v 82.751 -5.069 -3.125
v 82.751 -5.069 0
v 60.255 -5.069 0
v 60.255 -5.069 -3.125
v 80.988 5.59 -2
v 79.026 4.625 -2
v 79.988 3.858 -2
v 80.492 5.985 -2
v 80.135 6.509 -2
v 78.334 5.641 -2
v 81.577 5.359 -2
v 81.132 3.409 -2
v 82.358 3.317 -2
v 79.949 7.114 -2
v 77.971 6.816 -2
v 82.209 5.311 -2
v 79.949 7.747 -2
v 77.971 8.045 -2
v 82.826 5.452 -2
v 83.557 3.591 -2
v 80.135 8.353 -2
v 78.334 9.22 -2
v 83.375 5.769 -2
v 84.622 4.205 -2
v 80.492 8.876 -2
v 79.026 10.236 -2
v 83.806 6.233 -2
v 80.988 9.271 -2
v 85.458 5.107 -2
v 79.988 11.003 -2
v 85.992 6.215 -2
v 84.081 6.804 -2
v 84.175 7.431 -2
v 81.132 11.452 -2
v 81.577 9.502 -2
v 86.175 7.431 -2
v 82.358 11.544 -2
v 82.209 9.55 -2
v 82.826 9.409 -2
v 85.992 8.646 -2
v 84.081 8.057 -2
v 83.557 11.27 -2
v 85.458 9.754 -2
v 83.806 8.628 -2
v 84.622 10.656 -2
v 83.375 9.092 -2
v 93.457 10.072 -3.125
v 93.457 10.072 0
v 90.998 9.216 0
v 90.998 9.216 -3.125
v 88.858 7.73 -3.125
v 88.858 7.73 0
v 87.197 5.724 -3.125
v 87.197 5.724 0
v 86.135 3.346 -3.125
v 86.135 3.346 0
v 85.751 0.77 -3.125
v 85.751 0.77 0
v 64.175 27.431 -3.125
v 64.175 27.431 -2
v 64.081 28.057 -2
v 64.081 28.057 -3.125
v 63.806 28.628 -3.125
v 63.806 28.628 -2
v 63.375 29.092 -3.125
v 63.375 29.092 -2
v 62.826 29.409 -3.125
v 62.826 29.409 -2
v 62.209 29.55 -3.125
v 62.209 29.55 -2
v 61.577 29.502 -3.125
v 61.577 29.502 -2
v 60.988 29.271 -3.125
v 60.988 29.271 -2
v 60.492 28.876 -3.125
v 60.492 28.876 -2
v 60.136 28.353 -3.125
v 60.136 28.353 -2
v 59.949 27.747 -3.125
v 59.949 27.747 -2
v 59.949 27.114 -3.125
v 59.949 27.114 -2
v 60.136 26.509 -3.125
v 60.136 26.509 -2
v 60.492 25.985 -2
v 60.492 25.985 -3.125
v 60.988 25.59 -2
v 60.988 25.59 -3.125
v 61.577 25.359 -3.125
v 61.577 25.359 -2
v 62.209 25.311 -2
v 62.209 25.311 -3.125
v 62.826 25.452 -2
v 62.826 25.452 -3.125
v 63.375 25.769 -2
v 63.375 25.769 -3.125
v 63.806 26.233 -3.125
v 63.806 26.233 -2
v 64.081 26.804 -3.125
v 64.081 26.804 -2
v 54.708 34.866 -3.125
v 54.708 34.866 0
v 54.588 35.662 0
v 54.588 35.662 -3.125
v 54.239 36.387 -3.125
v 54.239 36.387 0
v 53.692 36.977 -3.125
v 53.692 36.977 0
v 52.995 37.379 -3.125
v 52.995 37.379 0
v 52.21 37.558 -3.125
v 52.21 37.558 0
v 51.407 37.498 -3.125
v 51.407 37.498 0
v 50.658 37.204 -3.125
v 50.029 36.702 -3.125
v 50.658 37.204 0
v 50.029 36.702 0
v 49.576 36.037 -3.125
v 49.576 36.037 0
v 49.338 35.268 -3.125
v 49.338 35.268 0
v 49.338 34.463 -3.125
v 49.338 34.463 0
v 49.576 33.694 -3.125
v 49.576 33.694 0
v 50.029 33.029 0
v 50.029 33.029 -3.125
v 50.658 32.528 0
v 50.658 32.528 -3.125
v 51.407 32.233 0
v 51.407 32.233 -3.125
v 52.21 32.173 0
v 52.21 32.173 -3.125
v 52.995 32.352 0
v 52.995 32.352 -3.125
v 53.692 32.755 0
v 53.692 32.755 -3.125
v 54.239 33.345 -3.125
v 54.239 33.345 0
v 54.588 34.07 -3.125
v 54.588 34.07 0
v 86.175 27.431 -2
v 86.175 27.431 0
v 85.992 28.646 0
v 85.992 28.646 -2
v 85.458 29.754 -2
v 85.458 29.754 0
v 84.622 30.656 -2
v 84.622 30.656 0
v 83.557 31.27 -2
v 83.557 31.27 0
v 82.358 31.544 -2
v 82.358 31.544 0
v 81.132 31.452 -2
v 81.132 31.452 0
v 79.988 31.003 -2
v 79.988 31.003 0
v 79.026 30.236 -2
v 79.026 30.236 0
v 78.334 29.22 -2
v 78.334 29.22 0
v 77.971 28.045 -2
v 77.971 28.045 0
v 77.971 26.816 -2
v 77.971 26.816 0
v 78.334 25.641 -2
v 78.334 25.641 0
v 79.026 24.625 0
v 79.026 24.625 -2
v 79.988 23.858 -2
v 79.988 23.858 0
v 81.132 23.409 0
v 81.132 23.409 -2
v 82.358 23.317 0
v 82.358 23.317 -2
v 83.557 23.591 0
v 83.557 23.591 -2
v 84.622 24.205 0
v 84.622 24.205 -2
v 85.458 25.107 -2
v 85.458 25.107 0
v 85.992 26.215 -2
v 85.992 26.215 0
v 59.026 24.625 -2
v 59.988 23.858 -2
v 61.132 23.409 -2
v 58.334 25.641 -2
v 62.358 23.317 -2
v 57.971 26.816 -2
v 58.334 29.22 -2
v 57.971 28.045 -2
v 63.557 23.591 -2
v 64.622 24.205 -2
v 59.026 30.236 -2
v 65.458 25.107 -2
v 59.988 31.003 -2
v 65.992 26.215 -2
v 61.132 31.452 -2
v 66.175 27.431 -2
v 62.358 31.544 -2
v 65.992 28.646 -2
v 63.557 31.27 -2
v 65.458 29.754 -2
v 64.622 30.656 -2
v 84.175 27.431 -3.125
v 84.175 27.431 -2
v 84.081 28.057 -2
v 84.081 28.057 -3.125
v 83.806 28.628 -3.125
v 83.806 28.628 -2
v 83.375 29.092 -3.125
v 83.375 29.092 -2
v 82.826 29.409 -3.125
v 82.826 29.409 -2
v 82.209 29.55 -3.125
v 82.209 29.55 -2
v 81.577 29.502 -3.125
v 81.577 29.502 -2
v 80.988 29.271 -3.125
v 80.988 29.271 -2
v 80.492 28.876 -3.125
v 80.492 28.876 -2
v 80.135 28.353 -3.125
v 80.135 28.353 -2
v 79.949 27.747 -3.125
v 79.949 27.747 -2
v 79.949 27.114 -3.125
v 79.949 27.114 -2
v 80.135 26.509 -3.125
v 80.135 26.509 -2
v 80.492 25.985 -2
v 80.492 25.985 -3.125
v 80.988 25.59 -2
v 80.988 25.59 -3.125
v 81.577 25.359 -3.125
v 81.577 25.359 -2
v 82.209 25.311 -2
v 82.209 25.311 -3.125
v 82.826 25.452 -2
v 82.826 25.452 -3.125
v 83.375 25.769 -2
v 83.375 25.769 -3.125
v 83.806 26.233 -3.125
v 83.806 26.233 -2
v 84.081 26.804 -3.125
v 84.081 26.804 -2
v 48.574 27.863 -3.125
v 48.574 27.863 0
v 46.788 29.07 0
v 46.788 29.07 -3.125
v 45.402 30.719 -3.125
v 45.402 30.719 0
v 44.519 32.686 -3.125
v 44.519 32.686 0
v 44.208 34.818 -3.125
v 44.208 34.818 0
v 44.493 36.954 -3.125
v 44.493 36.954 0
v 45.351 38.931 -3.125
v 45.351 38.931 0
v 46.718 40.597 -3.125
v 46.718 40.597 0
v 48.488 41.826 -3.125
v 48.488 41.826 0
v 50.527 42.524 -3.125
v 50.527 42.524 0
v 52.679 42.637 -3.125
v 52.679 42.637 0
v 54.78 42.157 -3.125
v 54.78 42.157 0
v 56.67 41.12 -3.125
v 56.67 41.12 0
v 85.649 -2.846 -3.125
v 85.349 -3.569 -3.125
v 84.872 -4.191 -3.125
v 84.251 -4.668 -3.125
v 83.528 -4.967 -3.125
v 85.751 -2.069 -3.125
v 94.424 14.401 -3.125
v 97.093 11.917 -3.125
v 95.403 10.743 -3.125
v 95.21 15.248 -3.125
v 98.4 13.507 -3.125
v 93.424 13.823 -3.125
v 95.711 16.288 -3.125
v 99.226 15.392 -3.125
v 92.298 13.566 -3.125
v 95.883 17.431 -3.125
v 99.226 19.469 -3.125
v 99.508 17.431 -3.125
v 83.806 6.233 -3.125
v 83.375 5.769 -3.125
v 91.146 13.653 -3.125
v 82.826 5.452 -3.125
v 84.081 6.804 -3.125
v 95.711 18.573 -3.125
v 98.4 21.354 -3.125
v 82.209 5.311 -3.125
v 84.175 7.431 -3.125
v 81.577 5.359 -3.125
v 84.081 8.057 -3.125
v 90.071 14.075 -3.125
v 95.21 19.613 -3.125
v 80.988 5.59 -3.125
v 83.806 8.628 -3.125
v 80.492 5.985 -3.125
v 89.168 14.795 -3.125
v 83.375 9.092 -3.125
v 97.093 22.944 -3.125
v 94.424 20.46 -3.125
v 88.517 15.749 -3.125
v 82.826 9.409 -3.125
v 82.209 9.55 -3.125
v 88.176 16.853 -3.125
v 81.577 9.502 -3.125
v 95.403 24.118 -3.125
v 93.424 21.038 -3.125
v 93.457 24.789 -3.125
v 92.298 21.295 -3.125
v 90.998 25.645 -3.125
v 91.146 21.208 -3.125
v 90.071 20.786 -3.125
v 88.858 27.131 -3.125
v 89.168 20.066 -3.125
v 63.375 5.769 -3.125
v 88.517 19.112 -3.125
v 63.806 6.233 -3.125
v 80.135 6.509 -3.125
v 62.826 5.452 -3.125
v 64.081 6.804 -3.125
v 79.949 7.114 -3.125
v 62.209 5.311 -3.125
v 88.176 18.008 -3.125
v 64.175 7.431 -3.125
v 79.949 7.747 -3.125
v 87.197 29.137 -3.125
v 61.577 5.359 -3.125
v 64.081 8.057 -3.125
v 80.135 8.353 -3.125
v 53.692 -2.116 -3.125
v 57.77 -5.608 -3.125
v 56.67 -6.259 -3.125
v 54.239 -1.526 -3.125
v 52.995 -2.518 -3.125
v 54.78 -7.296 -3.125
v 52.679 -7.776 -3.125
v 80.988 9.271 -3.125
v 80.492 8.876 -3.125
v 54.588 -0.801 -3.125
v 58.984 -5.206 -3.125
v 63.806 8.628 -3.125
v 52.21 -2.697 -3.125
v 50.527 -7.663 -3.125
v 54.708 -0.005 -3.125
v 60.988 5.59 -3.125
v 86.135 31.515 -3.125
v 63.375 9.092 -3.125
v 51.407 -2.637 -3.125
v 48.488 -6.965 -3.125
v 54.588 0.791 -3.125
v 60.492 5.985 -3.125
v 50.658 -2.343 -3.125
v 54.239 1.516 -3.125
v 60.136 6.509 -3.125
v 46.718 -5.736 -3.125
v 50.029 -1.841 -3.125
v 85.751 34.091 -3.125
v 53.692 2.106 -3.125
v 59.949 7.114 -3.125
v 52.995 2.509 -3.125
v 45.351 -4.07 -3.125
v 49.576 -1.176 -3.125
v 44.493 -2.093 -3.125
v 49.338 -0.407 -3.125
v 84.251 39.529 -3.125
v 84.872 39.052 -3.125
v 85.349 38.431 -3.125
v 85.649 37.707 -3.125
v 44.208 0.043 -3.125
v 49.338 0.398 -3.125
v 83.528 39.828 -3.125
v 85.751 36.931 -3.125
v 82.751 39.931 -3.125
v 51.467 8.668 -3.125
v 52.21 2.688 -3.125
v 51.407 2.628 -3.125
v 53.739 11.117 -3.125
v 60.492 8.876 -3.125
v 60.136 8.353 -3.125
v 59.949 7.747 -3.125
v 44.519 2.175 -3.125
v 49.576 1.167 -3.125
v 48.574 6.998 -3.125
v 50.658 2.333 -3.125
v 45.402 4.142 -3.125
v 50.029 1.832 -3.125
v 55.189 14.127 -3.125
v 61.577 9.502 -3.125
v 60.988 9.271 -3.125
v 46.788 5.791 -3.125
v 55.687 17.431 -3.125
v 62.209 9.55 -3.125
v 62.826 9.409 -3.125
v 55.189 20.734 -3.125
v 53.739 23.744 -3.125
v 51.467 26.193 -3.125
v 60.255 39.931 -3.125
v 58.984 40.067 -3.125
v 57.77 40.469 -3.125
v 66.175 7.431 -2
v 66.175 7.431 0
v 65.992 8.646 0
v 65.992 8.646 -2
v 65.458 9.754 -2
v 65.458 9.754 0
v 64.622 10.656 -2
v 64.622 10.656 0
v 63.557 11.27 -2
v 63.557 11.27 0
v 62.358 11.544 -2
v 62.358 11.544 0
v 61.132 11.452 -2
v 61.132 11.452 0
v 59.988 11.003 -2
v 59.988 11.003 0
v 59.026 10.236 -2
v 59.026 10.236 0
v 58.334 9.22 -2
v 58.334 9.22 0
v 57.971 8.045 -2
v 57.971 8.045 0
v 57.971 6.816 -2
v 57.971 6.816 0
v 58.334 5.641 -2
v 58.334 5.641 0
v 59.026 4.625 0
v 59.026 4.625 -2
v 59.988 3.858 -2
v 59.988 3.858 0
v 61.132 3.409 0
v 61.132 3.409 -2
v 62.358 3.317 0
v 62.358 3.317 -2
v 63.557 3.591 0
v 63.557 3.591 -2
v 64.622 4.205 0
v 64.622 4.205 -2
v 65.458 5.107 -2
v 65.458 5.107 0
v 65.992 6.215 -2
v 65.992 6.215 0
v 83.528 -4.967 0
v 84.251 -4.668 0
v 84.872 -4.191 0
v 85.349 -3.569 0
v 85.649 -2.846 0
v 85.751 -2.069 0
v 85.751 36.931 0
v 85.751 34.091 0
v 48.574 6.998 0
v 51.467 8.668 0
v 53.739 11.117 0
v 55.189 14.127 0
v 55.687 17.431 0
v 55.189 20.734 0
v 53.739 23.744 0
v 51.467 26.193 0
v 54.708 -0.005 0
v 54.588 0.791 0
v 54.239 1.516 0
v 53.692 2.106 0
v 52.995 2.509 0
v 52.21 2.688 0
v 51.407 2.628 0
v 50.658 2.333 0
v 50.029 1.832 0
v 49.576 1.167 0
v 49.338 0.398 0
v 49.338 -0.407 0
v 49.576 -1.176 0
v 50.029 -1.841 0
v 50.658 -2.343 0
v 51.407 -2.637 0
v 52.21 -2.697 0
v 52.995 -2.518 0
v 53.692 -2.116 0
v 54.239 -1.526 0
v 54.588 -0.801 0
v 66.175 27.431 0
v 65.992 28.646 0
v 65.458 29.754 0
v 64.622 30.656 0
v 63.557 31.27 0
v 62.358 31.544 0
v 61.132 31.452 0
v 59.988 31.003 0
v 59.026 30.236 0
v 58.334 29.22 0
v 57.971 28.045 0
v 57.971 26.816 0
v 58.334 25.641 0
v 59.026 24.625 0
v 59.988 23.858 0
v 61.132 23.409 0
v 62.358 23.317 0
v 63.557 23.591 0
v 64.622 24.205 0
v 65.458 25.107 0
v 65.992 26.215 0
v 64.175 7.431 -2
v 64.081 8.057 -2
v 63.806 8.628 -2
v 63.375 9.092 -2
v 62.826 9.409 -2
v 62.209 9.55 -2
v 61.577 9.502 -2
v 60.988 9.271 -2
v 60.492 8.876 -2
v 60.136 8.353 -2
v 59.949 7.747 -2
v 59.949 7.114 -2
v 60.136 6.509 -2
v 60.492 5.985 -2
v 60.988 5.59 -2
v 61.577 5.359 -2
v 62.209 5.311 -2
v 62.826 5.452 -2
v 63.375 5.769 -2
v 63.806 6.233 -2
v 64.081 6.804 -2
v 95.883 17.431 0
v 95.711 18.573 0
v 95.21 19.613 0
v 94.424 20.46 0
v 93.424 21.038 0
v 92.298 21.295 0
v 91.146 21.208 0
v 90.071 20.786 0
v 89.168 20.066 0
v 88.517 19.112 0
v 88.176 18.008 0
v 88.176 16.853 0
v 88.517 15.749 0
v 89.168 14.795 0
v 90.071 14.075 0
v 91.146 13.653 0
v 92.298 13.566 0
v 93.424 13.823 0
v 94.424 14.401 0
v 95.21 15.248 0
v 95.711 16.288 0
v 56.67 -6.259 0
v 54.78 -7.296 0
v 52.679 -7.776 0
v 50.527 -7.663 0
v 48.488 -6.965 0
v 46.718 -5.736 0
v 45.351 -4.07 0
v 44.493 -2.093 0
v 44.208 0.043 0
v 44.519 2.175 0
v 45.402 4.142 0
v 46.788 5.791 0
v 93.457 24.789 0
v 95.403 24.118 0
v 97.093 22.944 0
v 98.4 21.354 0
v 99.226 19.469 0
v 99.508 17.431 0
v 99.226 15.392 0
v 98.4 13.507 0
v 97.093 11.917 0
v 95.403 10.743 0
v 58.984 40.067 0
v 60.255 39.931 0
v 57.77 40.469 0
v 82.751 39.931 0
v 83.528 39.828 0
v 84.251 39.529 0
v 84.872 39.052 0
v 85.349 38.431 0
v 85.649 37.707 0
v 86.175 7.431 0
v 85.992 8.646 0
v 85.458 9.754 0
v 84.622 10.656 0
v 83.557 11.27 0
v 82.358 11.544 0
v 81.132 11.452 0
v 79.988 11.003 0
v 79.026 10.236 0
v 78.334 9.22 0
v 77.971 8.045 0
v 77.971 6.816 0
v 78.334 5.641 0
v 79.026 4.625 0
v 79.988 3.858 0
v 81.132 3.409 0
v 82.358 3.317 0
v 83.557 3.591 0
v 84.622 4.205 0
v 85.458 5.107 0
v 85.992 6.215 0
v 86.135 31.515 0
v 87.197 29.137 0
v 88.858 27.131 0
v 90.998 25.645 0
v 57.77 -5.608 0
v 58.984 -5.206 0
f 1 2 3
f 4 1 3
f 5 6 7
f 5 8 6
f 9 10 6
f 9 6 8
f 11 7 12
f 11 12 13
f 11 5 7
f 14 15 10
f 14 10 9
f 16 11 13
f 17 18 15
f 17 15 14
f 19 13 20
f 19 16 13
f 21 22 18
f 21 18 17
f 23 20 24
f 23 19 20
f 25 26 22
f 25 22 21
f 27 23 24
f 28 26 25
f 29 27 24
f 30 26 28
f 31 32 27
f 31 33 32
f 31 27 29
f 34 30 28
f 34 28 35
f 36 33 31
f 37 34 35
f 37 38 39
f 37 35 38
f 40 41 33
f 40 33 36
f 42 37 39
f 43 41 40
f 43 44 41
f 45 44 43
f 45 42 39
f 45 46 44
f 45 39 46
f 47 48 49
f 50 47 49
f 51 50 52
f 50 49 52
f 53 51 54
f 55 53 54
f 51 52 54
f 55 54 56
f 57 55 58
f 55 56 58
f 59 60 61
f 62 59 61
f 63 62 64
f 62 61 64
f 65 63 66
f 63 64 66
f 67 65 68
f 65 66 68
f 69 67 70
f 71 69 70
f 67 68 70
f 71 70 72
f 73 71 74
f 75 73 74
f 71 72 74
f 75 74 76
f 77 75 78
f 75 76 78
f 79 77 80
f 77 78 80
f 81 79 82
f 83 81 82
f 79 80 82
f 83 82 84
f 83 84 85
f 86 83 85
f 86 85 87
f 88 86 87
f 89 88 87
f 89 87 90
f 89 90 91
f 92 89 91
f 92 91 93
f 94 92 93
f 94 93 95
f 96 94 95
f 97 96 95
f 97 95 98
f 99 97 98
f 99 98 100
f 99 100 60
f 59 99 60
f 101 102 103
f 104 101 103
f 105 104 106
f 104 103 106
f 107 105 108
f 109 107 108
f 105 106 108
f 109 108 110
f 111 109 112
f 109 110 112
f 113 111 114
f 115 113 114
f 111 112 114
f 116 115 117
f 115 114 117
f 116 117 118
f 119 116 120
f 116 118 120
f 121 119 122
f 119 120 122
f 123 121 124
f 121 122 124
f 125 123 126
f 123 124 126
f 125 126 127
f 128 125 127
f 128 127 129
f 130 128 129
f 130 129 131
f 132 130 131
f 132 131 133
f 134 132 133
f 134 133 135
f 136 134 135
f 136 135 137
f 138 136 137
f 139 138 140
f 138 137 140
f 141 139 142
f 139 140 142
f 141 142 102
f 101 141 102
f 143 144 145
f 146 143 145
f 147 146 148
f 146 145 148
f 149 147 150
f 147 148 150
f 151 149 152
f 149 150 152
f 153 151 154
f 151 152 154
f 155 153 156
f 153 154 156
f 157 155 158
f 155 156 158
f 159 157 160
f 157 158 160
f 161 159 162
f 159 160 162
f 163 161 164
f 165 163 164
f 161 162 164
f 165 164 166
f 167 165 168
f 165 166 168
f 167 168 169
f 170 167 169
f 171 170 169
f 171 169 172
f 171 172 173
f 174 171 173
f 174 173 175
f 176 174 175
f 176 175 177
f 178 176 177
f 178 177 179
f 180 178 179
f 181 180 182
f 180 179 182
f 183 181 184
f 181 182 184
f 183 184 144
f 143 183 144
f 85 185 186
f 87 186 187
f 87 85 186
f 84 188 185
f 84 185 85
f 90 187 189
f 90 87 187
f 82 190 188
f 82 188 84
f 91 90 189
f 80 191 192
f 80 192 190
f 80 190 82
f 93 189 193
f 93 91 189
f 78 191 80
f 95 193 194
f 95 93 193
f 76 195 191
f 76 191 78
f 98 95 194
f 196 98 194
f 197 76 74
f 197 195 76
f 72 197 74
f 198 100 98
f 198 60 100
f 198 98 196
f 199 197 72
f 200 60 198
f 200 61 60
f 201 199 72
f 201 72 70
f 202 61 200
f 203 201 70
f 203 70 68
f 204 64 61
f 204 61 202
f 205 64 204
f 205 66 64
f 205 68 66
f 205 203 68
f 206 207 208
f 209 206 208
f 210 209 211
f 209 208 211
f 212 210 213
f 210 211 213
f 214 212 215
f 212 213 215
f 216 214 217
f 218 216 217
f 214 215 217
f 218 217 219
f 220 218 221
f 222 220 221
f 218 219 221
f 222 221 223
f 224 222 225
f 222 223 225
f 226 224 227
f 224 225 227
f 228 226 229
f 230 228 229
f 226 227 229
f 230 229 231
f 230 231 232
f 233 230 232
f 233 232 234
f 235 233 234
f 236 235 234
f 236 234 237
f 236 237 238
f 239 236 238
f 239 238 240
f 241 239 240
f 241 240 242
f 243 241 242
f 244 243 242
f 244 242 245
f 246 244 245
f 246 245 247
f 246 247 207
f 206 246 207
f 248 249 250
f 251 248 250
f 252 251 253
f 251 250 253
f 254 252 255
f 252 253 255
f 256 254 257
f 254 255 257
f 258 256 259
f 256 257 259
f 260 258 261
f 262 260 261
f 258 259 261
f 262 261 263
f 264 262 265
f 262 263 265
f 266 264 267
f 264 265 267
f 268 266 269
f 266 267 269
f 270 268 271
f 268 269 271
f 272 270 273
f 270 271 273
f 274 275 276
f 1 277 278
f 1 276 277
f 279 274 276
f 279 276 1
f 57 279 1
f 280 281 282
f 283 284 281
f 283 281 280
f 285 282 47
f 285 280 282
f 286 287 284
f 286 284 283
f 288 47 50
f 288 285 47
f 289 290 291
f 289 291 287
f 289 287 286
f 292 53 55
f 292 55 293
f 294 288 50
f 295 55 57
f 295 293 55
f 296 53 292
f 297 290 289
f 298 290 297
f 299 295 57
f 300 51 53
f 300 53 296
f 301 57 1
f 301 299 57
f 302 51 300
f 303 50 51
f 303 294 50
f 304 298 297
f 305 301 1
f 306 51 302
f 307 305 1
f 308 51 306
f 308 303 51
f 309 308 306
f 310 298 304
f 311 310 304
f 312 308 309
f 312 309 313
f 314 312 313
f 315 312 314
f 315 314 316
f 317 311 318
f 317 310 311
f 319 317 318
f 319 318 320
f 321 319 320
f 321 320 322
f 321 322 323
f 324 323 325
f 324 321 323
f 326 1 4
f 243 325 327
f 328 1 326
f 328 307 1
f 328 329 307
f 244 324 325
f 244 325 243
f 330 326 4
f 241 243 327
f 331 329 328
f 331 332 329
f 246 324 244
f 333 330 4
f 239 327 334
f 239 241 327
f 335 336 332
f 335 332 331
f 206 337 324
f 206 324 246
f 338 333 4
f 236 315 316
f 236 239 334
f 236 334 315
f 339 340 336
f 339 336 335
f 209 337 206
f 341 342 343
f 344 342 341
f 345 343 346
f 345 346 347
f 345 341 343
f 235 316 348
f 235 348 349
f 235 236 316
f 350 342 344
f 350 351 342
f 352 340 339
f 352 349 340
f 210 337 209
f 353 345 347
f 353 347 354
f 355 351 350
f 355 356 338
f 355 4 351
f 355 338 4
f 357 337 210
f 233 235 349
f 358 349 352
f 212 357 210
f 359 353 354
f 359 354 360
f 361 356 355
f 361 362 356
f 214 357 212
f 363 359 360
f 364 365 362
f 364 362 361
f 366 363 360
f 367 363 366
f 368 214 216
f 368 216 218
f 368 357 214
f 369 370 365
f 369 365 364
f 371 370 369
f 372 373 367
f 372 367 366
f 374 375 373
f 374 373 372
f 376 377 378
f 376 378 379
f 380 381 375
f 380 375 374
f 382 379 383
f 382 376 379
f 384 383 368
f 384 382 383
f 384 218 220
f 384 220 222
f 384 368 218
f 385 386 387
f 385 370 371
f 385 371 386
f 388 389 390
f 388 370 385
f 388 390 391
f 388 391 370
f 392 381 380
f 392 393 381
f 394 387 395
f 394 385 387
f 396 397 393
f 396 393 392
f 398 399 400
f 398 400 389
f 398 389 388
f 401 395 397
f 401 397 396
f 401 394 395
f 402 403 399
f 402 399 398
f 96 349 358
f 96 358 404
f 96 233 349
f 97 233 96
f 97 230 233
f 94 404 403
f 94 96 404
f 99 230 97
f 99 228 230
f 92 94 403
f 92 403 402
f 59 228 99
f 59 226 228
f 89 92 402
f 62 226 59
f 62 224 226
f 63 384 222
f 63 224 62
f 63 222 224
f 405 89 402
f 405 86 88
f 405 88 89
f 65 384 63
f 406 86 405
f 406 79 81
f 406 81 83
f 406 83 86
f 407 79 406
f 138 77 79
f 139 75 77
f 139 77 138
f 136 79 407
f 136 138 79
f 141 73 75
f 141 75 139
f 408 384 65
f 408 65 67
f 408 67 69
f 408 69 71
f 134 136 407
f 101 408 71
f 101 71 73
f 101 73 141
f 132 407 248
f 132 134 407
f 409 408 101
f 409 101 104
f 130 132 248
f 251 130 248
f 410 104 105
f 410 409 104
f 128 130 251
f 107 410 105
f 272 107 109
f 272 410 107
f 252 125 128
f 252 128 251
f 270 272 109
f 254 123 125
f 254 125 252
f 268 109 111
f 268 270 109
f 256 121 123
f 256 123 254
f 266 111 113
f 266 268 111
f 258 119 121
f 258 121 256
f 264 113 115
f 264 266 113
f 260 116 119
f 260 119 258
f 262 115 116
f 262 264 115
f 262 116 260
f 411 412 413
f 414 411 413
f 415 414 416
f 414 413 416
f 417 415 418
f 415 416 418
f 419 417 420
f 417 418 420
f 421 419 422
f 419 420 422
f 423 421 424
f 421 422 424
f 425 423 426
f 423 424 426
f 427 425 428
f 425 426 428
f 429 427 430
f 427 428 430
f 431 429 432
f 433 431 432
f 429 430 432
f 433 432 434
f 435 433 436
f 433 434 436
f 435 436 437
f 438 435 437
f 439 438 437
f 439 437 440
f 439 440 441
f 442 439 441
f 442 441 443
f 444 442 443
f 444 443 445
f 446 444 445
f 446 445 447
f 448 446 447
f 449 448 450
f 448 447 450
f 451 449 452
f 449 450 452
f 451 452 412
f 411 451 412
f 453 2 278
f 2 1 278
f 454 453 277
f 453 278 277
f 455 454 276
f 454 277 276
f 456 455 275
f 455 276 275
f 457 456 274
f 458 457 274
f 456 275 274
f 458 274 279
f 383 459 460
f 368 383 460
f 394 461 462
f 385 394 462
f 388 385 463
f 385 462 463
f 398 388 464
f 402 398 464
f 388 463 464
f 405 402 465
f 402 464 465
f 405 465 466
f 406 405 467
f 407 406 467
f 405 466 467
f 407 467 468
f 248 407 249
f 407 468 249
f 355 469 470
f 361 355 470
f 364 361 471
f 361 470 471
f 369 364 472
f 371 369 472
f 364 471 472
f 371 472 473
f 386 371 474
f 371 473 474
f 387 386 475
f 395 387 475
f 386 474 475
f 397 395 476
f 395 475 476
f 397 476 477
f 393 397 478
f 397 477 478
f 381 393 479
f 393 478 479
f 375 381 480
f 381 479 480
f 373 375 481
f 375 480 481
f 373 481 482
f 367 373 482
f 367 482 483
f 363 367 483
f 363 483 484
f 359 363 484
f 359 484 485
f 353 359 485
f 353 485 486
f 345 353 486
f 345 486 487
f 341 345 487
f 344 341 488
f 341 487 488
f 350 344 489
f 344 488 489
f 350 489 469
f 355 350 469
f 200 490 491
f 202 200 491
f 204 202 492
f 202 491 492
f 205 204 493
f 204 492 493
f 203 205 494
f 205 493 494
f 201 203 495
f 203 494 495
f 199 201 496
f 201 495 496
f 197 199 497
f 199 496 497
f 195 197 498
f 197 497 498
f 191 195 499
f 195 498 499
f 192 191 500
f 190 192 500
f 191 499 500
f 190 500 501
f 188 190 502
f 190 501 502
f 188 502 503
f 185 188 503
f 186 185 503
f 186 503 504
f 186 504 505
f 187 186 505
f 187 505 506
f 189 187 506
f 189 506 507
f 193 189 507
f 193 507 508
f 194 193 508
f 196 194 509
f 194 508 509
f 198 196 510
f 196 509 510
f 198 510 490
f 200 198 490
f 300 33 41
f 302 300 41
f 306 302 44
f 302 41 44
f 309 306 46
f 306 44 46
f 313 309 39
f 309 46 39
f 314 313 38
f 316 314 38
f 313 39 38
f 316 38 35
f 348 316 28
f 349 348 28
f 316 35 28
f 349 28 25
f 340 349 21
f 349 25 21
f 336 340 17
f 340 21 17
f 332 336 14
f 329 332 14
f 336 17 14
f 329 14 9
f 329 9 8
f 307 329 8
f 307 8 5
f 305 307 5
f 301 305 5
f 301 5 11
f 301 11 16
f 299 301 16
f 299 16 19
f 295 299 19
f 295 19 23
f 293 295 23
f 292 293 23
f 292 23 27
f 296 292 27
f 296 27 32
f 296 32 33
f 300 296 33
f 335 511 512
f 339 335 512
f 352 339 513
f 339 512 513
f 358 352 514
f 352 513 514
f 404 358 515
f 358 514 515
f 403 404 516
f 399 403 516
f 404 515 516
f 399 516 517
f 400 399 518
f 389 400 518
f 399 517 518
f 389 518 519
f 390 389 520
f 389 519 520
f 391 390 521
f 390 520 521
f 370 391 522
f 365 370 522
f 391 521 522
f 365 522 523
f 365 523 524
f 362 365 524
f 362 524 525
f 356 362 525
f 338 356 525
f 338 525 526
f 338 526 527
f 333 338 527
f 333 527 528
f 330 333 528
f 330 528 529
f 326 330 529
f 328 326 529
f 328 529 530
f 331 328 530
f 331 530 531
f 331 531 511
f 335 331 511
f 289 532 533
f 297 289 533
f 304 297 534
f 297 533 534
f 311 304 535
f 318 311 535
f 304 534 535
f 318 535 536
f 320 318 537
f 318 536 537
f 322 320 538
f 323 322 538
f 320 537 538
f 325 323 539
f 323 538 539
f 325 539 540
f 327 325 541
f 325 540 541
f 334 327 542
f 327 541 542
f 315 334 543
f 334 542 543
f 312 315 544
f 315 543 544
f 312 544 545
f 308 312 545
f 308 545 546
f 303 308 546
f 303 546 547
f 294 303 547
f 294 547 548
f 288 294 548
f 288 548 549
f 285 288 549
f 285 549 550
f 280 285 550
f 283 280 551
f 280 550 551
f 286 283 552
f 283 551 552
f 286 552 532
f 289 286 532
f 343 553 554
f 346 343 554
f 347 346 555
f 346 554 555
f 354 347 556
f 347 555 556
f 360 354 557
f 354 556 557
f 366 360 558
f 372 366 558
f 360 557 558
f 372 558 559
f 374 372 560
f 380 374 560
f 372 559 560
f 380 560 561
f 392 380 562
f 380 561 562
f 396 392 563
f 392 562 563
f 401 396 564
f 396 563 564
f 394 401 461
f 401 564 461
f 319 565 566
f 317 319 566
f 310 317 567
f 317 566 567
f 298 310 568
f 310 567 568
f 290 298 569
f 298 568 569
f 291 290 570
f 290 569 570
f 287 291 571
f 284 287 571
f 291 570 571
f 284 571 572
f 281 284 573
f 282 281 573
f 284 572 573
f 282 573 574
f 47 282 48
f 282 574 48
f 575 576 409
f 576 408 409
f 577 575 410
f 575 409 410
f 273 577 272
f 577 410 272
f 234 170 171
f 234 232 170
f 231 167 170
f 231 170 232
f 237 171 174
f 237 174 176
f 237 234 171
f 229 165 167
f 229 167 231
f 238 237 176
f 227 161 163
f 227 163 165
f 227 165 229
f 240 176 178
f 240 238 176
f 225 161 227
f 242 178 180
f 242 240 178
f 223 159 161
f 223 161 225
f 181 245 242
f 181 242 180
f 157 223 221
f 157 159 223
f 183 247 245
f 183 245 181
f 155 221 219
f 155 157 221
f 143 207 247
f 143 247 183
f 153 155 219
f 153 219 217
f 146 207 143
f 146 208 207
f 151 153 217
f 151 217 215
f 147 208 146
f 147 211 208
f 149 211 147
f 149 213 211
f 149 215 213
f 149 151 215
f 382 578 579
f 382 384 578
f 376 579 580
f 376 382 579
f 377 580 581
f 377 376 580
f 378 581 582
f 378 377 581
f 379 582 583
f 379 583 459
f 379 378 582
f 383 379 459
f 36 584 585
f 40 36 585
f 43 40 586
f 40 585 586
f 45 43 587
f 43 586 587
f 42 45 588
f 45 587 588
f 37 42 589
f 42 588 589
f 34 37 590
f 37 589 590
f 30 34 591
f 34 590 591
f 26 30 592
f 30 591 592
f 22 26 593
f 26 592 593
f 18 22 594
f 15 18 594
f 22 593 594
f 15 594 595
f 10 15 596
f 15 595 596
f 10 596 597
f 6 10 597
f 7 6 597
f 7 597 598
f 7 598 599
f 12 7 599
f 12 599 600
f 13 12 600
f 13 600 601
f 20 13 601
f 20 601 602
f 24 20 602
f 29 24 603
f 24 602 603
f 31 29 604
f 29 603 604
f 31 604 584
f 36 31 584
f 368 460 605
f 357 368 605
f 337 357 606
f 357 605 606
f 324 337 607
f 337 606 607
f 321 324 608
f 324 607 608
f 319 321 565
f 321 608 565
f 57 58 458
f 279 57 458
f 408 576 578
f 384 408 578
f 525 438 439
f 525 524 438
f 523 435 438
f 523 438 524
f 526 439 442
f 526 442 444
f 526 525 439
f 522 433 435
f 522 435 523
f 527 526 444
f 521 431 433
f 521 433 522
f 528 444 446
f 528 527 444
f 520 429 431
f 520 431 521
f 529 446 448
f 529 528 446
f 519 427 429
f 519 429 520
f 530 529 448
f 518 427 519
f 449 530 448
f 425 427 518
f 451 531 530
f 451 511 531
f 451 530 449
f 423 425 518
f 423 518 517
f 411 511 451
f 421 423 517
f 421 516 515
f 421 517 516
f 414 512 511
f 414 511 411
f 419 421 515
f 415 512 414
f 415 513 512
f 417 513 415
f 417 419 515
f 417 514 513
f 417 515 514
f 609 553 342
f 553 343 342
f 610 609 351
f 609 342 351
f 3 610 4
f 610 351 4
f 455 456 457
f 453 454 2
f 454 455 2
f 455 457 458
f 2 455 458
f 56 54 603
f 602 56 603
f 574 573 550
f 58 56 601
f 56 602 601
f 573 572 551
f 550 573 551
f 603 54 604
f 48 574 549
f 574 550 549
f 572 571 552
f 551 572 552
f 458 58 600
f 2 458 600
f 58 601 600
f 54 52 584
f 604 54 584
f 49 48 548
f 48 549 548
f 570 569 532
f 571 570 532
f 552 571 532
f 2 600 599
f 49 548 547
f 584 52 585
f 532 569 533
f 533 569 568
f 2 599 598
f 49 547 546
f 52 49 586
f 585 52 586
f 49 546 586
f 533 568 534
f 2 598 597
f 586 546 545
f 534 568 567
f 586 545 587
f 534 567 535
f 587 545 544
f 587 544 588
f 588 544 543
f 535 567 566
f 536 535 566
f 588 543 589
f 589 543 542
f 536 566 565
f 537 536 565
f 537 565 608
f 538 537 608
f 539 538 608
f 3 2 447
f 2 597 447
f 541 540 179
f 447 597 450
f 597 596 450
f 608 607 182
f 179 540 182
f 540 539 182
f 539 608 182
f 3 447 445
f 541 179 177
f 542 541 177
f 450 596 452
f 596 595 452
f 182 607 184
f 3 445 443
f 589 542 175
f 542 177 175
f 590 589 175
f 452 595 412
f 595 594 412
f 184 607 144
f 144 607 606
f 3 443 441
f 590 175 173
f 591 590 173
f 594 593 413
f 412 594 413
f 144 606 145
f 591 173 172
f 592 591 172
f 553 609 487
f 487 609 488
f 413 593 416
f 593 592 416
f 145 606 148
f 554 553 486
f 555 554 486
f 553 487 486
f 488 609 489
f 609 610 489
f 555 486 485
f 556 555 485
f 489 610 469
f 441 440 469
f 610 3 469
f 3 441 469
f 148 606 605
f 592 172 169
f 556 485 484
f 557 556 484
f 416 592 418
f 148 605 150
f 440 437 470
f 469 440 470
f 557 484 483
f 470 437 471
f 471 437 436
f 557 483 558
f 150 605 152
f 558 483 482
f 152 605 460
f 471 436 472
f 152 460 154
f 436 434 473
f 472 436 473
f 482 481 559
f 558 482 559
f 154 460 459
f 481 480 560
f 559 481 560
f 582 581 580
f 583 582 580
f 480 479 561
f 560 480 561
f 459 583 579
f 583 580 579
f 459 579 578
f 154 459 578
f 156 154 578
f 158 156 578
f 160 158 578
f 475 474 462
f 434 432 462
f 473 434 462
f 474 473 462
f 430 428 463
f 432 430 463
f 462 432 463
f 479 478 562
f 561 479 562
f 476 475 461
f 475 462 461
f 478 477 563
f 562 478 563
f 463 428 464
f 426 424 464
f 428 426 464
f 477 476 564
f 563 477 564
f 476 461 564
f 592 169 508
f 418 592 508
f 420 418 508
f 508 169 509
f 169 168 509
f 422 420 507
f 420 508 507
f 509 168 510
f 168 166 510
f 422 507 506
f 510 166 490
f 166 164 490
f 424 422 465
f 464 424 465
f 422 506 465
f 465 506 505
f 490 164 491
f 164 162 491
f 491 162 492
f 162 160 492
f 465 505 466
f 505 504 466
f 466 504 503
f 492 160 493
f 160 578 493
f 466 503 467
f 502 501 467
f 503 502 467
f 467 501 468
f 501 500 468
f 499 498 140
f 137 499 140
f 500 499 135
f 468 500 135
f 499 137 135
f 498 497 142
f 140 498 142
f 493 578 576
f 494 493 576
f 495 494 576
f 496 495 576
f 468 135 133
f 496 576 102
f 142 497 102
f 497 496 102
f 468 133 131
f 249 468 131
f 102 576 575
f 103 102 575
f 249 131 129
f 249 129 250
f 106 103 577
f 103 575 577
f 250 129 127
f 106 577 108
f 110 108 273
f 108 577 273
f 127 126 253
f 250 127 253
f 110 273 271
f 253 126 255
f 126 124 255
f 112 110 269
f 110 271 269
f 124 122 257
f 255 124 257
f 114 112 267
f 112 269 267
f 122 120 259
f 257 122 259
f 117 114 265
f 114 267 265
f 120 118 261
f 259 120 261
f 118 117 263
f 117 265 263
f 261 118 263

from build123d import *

# Parameters (mm, degrees)
MODEL_R             = 2.7
MODEL_R_2           = 3.875
MODEL_R_3           = 2.125
BOSS_EXTRUDE1_DEPTH = 3.125
MODEL_3_R           = 4.125
MODEL_3_R_2         = 2.125
CUT_EXTRUDE1_DEPTH  = 2
FILLET1_R           = 3
FILLET2_R           = 6


with BuildPart() as part:
    # Model → Boss-Extrude1 (new body)
    with BuildSketch(Plane.XY):
        with BuildLine():
            Line((85.751165458, 39.930508181), (57.940219492, 39.930508181))
            ThreePointArc((57.940219492, 39.930508181), (45.846452894, 39.648352972), (48.573590158, 27.862703884))
            ThreePointArc((48.573590158, 27.862703884), (55.686625956, 17.430508181), (48.573590158, 6.998312478))
            ThreePointArc((48.573590158, 6.998312478), (45.846452894, -4.78733661), (57.940219492, -5.069491819))
            Line((57.940219492, -5.069491819), (85.751165458, -5.069491819))
            Line((85.751165458, -5.069491819), (85.751165458, 0.769903947))
            ThreePointArc((85.751165458, 0.769903947), (87.9590359, 6.783913161), (93.457436342, 10.071859524))
            ThreePointArc((93.457436342, 10.071859524), (99.50819863, 17.430508181), (93.457436342, 24.789156838))
            ThreePointArc((93.457436342, 24.789156838), (87.9590359, 28.077103201), (85.751165458, 34.091112415))
            Line((85.751165458, 34.091112415), (85.751165458, 39.930508181))
        make_face()
        with Locations((52.008207521, -0.004787091)):
            Circle(MODEL_R, mode=Mode.SUBTRACT)
        with Locations((52.008207521, 34.865803453)):
            Circle(MODEL_R, mode=Mode.SUBTRACT)
        with Locations((92.00819863, 17.430508181)):
            Circle(MODEL_R_2, mode=Mode.SUBTRACT)
        with Locations((62.05010788, 7.430508181)):
            Circle(MODEL_R_3, mode=Mode.SUBTRACT)
        with Locations((82.050054867, 7.430508181)):
            Circle(MODEL_R_3, mode=Mode.SUBTRACT)
        with Locations((62.05010788, 27.430508181)):
            Circle(MODEL_R_3, mode=Mode.SUBTRACT)
        with Locations((82.050054867, 27.430508181)):
            Circle(MODEL_R_3, mode=Mode.SUBTRACT)
    extrude(amount=-BOSS_EXTRUDE1_DEPTH)

    # Model<3> → Cut-Extrude1 (cut)
    # profile 1 of 4: a face of its own
    with BuildSketch(Plane.XY):
        with Locations((82.050054867, 27.430508181)):
            Circle(MODEL_3_R)
    # profile 2 of 4: a face of its own
    with BuildSketch(Plane.XY):
        with Locations((62.05010788, 27.430508181)):
            Circle(MODEL_3_R)
        with Locations((62.05010788, 27.430508181)):
            Circle(MODEL_3_R_2, mode=Mode.SUBTRACT)
    # profile 3 of 4: a face of its own
    with BuildSketch(Plane.XY):
        with Locations((62.05010788, 7.430508181)):
            Circle(MODEL_3_R)
        with Locations((62.05010788, 7.430508181)):
            Circle(MODEL_3_R_2, mode=Mode.SUBTRACT)
    # profile 4 of 4: a face of its own
    with BuildSketch(Plane.XY):
        with Locations((82.050054867, 7.430508181)):
            Circle(MODEL_3_R)
        with Locations((82.050054867, 7.430508181)):
            Circle(MODEL_3_R_2, mode=Mode.SUBTRACT)
    extrude(amount=-CUT_EXTRUDE1_DEPTH, mode=Mode.SUBTRACT)

    # Fillet1
    fillet1_edges = [part.edges().sort_by_distance(p)[0] for p in [
        (85.751165458, -5.069491819, -1.5625),
        (85.751165458, 39.930508181, -1.5625),
    ]]
    fillet(fillet1_edges, radius=FILLET1_R)

    # Fillet2
    fillet2_edges = [part.edges().sort_by_distance(p)[0] for p in [
        (57.940219492, 39.930508181, -1.5625),
        (57.940219492, -5.069491819, -1.5625),
    ]]
    fillet(fillet2_edges, radius=FILLET2_R)


solid = part.part
